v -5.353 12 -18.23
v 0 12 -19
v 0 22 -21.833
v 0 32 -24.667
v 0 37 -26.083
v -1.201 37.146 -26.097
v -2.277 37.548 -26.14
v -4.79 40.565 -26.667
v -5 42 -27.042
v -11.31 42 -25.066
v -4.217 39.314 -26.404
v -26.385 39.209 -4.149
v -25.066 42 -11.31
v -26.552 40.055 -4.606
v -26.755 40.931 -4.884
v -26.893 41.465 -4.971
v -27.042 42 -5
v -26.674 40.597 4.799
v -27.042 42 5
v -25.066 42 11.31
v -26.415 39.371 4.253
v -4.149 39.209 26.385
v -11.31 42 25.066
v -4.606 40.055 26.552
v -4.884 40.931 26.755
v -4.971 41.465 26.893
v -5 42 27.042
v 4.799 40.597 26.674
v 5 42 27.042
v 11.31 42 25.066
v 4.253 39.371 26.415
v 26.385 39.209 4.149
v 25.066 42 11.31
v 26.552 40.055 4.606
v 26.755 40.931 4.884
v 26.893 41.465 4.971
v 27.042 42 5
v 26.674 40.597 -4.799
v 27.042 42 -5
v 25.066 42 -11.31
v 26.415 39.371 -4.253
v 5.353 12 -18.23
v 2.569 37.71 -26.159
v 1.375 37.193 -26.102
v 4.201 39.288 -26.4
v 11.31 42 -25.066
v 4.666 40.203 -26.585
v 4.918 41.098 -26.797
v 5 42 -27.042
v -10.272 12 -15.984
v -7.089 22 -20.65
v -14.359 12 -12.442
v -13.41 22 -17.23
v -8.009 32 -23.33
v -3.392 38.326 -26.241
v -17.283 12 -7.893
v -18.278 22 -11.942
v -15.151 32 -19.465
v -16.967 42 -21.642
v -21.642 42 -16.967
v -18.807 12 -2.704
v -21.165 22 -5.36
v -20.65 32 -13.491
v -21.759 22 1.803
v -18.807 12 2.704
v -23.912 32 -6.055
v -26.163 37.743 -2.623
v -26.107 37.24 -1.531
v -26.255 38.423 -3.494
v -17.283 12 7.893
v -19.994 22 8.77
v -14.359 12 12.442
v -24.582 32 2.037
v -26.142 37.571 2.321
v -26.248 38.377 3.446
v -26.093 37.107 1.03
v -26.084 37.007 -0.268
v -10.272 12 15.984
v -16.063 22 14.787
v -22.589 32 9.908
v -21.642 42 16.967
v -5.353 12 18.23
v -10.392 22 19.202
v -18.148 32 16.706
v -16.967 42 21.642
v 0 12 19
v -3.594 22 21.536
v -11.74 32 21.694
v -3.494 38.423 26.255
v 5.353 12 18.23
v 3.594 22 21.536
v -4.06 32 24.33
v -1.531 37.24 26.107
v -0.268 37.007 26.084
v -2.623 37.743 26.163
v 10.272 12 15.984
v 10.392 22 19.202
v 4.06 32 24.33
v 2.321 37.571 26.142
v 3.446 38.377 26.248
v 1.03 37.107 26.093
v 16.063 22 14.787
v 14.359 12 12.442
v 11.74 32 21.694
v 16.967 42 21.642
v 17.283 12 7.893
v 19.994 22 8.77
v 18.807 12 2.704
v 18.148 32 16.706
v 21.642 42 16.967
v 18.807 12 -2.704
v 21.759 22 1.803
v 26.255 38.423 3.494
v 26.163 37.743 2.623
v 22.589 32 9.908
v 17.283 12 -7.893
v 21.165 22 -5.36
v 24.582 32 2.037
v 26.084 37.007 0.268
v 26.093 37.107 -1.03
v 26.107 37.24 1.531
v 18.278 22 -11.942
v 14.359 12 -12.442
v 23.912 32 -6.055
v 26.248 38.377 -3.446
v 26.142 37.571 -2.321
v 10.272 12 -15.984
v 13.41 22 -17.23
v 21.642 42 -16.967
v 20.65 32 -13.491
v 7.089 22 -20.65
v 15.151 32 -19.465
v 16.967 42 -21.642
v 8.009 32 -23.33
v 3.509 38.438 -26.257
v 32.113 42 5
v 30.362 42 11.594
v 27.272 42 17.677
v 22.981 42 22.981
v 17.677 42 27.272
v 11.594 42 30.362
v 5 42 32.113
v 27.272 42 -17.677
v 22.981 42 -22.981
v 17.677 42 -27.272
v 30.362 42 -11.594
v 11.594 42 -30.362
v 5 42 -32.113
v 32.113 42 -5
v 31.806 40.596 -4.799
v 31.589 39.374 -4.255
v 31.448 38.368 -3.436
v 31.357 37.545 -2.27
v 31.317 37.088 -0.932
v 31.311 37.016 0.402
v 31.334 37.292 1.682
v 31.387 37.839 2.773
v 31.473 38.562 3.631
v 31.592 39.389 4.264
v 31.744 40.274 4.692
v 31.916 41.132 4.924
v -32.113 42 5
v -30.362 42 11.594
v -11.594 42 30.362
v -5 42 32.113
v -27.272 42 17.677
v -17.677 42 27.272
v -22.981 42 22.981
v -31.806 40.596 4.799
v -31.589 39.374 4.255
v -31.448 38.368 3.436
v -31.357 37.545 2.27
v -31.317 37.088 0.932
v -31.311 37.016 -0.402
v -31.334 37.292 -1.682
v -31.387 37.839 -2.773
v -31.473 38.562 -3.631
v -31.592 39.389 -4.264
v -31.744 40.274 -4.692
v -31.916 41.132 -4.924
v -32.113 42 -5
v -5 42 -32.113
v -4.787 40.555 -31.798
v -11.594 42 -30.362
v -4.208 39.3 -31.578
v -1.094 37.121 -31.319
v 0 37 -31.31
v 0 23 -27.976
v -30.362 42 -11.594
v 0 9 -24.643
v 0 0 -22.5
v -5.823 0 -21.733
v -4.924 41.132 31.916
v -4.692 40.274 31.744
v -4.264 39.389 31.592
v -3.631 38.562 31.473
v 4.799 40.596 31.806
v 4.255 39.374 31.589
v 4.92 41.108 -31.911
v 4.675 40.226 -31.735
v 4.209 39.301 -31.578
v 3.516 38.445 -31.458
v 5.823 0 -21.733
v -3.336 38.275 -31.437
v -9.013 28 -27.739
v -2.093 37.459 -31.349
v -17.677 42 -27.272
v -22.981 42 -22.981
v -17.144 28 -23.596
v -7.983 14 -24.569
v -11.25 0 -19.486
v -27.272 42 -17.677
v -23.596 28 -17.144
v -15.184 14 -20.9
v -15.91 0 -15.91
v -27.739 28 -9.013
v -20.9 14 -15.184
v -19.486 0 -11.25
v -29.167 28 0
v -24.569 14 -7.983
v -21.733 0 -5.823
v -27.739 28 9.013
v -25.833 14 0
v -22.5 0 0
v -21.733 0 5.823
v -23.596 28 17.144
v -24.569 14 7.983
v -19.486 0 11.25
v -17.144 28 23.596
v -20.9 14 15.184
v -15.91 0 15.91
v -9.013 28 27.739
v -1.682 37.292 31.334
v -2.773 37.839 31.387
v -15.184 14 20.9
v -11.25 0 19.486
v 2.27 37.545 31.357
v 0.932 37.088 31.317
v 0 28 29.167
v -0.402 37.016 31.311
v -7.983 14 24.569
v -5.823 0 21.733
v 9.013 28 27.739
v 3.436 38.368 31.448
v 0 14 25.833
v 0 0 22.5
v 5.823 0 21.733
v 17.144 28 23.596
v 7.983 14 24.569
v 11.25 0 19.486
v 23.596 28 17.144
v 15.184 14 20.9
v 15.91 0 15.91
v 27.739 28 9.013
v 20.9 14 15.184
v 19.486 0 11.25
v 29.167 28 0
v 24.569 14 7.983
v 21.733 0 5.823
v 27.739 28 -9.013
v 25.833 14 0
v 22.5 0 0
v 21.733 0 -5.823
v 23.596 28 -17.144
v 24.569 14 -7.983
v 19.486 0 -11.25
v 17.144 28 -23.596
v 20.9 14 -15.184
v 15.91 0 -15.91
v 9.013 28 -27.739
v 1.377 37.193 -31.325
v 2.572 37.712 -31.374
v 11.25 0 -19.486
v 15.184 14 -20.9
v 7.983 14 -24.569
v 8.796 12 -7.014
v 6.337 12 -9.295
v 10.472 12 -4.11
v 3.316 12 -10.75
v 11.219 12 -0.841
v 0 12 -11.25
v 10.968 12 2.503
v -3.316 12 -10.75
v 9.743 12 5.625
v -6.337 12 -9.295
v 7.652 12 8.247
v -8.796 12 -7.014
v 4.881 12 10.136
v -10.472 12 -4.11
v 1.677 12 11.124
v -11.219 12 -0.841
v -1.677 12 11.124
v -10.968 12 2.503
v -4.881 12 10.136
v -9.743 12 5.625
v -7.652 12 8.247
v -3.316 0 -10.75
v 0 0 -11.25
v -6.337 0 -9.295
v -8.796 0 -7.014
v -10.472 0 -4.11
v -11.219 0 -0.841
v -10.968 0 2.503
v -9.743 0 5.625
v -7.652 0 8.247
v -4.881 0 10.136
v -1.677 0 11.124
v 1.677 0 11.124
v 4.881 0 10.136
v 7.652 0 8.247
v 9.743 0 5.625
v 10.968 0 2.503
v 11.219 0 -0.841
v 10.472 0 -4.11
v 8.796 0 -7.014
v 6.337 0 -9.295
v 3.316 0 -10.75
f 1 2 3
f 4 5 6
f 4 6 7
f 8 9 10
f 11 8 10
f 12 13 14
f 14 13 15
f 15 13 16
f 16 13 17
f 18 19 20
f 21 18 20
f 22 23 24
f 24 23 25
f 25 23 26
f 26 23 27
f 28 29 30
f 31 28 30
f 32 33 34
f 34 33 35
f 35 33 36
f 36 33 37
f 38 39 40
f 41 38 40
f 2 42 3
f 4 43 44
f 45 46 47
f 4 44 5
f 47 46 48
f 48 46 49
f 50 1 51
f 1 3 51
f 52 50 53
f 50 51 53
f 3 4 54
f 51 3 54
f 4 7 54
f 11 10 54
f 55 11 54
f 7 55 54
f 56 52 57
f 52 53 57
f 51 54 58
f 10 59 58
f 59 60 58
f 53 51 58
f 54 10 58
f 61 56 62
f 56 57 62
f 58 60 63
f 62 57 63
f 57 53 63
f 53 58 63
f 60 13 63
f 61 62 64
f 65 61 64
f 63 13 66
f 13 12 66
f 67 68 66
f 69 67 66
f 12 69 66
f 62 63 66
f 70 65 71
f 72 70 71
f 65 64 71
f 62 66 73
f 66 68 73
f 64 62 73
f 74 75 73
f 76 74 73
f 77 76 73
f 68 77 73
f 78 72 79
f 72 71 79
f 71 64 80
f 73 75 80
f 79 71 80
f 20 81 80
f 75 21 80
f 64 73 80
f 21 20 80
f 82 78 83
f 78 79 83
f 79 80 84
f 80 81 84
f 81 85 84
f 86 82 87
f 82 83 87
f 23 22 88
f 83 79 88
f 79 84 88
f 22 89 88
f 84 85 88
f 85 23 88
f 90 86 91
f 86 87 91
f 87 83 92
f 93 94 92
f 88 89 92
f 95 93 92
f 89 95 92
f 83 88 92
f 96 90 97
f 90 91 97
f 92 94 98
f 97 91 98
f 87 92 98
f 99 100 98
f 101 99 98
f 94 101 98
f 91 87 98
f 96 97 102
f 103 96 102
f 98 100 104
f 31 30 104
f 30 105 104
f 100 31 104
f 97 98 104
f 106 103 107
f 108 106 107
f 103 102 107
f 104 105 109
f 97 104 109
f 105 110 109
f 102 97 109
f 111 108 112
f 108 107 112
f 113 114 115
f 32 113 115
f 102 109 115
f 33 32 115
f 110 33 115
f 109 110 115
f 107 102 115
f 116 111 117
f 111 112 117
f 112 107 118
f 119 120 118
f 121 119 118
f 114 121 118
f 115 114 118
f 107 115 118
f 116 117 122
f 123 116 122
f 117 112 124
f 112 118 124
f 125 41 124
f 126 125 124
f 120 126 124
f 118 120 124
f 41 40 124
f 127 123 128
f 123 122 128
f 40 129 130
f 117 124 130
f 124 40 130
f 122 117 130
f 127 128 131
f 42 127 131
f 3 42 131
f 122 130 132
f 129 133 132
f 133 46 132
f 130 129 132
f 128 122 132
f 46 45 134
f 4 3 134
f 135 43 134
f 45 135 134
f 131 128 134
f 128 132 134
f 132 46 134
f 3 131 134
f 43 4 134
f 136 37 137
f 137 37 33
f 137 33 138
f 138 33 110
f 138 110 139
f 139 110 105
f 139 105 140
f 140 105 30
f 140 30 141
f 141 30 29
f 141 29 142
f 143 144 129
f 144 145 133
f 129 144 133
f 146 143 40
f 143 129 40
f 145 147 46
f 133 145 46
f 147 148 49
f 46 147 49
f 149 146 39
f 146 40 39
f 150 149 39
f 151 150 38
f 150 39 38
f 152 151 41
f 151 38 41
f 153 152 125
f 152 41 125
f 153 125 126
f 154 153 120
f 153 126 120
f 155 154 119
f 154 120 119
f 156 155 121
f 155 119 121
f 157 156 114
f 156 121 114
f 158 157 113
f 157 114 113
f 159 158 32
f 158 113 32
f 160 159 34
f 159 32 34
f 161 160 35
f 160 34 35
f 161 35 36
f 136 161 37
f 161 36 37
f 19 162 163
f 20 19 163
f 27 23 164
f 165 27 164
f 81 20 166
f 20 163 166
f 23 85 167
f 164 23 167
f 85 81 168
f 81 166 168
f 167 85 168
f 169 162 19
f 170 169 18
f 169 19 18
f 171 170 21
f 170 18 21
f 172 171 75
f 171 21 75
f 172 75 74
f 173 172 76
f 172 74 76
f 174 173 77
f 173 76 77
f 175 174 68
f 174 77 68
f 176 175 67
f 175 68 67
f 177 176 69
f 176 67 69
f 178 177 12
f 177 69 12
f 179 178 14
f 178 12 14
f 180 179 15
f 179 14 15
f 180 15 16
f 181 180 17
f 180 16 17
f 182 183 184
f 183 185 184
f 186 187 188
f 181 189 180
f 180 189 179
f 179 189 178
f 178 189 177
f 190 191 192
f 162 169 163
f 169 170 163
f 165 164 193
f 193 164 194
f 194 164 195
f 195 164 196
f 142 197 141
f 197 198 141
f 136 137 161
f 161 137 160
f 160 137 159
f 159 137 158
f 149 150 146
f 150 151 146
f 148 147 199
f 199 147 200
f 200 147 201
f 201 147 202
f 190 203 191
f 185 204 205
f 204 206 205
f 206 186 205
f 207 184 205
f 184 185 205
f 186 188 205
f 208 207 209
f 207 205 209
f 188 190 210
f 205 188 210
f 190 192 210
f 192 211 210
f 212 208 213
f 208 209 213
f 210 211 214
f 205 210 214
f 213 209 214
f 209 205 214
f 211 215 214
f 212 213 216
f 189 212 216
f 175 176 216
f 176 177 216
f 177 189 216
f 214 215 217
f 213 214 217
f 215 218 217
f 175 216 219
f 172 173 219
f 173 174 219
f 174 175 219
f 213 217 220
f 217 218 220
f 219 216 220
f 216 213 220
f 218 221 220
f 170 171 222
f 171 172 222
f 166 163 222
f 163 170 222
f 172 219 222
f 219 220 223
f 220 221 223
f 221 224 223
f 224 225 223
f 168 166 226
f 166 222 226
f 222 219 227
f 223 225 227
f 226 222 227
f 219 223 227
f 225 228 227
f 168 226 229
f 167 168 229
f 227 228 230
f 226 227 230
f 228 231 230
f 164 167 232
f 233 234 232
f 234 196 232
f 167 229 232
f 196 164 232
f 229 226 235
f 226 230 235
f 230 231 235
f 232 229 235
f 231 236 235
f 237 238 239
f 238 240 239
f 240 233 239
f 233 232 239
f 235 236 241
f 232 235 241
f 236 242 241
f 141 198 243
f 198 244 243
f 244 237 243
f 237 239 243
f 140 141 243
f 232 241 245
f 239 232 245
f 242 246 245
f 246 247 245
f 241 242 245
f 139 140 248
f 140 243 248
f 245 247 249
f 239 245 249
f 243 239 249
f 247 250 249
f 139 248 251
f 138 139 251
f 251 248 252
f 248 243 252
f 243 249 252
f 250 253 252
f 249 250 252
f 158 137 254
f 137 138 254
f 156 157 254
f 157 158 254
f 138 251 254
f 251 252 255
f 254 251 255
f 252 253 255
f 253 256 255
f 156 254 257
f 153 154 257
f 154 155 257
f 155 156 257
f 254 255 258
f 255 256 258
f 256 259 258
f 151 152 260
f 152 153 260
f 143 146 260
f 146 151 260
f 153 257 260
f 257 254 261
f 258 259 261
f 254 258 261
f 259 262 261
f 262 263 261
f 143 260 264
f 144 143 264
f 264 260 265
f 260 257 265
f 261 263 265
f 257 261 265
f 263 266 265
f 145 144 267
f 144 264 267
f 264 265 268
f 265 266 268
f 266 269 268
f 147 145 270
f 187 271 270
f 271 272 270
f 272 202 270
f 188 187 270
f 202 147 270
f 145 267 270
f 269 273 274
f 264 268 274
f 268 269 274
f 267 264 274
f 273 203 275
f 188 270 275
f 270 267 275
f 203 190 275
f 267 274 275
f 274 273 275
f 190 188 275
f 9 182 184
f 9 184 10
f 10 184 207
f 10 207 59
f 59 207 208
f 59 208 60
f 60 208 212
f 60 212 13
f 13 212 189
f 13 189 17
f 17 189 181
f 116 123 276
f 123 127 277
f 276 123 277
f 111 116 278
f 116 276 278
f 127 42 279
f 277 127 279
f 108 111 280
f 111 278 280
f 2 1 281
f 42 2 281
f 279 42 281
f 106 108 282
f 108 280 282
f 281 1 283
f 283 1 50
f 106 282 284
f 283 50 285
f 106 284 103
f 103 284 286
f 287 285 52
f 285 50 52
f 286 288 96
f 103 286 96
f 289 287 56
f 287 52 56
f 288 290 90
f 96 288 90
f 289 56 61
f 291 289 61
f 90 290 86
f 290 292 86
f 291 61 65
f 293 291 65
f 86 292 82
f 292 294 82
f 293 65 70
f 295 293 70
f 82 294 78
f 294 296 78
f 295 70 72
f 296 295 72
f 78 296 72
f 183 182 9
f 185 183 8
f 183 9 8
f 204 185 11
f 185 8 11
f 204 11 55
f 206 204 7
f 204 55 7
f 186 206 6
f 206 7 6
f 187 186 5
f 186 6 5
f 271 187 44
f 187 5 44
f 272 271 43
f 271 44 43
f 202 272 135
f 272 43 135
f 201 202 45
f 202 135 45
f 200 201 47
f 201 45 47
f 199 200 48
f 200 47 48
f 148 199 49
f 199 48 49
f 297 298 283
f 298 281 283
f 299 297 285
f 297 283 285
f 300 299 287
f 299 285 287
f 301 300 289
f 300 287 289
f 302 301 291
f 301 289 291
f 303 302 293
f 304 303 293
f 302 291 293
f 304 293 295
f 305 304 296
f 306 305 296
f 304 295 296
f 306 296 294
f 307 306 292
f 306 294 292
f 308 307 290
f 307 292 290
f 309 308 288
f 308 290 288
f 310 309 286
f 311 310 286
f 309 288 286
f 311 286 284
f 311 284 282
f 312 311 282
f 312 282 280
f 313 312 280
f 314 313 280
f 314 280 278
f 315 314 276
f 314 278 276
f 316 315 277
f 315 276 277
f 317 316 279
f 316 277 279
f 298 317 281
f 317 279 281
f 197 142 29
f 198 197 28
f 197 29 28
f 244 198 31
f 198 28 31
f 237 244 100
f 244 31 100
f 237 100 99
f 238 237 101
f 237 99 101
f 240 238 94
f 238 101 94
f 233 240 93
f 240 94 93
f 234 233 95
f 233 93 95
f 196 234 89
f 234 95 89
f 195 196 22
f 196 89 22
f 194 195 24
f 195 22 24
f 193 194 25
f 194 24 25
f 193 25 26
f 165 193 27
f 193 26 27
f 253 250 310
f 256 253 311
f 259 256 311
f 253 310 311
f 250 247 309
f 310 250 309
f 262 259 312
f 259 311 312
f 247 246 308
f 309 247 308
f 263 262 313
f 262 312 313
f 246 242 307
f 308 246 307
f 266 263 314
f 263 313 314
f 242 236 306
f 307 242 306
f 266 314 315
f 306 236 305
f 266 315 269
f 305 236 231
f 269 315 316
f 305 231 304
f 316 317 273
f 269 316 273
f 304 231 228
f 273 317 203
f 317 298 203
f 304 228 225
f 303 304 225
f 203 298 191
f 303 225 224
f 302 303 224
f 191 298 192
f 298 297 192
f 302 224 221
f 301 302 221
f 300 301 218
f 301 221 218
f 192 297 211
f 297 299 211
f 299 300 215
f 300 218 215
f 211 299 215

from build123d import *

# Parameters (mm, degrees)
CUT_EXTRUDE1_REACH = 64.262
SKETCH5_R          = 5
CIRPATTERN1_COUNT  = 4


with BuildPart() as part:
    # Sketch4 → Revolve1 (revolve)
    with BuildSketch(Plane.XY, mode=Mode.PRIVATE) as revolve1_sk:
        Polygon((11.25, 0), (11.25, 12), (19, 12), (27.5, 42), (32.5, 42), (22.5, 0), align=None)
    revolve(revolve1_sk.sketch.rotate(Axis((0, 0, 0), (0, 1, 0)), 90), axis=Axis((0, 0, 0), (0, 1, 0)))

    # Cut-Extrude1: up to this cone (the profile starts inside it)
    cut_extrude1_end = Plane(origin=(0, 42, 0), z_dir=(0, 1, 0)) * Cone(9.342380952, 55.657619048, 194.524, mode=Mode.PRIVATE)
    # Sketch5 → Cut-Extrude1 (cut, up to the surface)
    with BuildSketch(Plane.XY, mode=Mode.PRIVATE) as cut_extrude1_sk1:
        with Locations((0, 42)):
            Circle(SKETCH5_R)
    cut_extrude1_tool1 = extrude(cut_extrude1_sk1.sketch, amount=-CUT_EXTRUDE1_REACH, mode=Mode.PRIVATE) & cut_extrude1_end
    cut_extrude1 = cut_extrude1_tool1.solids().sort_by_distance((0, 42, 0))[0]
    add(cut_extrude1, mode=Mode.SUBTRACT)

    # CirPattern1: Cut-Extrude1 ×4 about axis
    cirpattern1_axis = Axis((0, 42, 0), (0, -1, 0))
    for i in range(1, CIRPATTERN1_COUNT):
        add(cut_extrude1.rotate(cirpattern1_axis, i * 360 / CIRPATTERN1_COUNT), mode=Mode.SUBTRACT)


solid = part.part
